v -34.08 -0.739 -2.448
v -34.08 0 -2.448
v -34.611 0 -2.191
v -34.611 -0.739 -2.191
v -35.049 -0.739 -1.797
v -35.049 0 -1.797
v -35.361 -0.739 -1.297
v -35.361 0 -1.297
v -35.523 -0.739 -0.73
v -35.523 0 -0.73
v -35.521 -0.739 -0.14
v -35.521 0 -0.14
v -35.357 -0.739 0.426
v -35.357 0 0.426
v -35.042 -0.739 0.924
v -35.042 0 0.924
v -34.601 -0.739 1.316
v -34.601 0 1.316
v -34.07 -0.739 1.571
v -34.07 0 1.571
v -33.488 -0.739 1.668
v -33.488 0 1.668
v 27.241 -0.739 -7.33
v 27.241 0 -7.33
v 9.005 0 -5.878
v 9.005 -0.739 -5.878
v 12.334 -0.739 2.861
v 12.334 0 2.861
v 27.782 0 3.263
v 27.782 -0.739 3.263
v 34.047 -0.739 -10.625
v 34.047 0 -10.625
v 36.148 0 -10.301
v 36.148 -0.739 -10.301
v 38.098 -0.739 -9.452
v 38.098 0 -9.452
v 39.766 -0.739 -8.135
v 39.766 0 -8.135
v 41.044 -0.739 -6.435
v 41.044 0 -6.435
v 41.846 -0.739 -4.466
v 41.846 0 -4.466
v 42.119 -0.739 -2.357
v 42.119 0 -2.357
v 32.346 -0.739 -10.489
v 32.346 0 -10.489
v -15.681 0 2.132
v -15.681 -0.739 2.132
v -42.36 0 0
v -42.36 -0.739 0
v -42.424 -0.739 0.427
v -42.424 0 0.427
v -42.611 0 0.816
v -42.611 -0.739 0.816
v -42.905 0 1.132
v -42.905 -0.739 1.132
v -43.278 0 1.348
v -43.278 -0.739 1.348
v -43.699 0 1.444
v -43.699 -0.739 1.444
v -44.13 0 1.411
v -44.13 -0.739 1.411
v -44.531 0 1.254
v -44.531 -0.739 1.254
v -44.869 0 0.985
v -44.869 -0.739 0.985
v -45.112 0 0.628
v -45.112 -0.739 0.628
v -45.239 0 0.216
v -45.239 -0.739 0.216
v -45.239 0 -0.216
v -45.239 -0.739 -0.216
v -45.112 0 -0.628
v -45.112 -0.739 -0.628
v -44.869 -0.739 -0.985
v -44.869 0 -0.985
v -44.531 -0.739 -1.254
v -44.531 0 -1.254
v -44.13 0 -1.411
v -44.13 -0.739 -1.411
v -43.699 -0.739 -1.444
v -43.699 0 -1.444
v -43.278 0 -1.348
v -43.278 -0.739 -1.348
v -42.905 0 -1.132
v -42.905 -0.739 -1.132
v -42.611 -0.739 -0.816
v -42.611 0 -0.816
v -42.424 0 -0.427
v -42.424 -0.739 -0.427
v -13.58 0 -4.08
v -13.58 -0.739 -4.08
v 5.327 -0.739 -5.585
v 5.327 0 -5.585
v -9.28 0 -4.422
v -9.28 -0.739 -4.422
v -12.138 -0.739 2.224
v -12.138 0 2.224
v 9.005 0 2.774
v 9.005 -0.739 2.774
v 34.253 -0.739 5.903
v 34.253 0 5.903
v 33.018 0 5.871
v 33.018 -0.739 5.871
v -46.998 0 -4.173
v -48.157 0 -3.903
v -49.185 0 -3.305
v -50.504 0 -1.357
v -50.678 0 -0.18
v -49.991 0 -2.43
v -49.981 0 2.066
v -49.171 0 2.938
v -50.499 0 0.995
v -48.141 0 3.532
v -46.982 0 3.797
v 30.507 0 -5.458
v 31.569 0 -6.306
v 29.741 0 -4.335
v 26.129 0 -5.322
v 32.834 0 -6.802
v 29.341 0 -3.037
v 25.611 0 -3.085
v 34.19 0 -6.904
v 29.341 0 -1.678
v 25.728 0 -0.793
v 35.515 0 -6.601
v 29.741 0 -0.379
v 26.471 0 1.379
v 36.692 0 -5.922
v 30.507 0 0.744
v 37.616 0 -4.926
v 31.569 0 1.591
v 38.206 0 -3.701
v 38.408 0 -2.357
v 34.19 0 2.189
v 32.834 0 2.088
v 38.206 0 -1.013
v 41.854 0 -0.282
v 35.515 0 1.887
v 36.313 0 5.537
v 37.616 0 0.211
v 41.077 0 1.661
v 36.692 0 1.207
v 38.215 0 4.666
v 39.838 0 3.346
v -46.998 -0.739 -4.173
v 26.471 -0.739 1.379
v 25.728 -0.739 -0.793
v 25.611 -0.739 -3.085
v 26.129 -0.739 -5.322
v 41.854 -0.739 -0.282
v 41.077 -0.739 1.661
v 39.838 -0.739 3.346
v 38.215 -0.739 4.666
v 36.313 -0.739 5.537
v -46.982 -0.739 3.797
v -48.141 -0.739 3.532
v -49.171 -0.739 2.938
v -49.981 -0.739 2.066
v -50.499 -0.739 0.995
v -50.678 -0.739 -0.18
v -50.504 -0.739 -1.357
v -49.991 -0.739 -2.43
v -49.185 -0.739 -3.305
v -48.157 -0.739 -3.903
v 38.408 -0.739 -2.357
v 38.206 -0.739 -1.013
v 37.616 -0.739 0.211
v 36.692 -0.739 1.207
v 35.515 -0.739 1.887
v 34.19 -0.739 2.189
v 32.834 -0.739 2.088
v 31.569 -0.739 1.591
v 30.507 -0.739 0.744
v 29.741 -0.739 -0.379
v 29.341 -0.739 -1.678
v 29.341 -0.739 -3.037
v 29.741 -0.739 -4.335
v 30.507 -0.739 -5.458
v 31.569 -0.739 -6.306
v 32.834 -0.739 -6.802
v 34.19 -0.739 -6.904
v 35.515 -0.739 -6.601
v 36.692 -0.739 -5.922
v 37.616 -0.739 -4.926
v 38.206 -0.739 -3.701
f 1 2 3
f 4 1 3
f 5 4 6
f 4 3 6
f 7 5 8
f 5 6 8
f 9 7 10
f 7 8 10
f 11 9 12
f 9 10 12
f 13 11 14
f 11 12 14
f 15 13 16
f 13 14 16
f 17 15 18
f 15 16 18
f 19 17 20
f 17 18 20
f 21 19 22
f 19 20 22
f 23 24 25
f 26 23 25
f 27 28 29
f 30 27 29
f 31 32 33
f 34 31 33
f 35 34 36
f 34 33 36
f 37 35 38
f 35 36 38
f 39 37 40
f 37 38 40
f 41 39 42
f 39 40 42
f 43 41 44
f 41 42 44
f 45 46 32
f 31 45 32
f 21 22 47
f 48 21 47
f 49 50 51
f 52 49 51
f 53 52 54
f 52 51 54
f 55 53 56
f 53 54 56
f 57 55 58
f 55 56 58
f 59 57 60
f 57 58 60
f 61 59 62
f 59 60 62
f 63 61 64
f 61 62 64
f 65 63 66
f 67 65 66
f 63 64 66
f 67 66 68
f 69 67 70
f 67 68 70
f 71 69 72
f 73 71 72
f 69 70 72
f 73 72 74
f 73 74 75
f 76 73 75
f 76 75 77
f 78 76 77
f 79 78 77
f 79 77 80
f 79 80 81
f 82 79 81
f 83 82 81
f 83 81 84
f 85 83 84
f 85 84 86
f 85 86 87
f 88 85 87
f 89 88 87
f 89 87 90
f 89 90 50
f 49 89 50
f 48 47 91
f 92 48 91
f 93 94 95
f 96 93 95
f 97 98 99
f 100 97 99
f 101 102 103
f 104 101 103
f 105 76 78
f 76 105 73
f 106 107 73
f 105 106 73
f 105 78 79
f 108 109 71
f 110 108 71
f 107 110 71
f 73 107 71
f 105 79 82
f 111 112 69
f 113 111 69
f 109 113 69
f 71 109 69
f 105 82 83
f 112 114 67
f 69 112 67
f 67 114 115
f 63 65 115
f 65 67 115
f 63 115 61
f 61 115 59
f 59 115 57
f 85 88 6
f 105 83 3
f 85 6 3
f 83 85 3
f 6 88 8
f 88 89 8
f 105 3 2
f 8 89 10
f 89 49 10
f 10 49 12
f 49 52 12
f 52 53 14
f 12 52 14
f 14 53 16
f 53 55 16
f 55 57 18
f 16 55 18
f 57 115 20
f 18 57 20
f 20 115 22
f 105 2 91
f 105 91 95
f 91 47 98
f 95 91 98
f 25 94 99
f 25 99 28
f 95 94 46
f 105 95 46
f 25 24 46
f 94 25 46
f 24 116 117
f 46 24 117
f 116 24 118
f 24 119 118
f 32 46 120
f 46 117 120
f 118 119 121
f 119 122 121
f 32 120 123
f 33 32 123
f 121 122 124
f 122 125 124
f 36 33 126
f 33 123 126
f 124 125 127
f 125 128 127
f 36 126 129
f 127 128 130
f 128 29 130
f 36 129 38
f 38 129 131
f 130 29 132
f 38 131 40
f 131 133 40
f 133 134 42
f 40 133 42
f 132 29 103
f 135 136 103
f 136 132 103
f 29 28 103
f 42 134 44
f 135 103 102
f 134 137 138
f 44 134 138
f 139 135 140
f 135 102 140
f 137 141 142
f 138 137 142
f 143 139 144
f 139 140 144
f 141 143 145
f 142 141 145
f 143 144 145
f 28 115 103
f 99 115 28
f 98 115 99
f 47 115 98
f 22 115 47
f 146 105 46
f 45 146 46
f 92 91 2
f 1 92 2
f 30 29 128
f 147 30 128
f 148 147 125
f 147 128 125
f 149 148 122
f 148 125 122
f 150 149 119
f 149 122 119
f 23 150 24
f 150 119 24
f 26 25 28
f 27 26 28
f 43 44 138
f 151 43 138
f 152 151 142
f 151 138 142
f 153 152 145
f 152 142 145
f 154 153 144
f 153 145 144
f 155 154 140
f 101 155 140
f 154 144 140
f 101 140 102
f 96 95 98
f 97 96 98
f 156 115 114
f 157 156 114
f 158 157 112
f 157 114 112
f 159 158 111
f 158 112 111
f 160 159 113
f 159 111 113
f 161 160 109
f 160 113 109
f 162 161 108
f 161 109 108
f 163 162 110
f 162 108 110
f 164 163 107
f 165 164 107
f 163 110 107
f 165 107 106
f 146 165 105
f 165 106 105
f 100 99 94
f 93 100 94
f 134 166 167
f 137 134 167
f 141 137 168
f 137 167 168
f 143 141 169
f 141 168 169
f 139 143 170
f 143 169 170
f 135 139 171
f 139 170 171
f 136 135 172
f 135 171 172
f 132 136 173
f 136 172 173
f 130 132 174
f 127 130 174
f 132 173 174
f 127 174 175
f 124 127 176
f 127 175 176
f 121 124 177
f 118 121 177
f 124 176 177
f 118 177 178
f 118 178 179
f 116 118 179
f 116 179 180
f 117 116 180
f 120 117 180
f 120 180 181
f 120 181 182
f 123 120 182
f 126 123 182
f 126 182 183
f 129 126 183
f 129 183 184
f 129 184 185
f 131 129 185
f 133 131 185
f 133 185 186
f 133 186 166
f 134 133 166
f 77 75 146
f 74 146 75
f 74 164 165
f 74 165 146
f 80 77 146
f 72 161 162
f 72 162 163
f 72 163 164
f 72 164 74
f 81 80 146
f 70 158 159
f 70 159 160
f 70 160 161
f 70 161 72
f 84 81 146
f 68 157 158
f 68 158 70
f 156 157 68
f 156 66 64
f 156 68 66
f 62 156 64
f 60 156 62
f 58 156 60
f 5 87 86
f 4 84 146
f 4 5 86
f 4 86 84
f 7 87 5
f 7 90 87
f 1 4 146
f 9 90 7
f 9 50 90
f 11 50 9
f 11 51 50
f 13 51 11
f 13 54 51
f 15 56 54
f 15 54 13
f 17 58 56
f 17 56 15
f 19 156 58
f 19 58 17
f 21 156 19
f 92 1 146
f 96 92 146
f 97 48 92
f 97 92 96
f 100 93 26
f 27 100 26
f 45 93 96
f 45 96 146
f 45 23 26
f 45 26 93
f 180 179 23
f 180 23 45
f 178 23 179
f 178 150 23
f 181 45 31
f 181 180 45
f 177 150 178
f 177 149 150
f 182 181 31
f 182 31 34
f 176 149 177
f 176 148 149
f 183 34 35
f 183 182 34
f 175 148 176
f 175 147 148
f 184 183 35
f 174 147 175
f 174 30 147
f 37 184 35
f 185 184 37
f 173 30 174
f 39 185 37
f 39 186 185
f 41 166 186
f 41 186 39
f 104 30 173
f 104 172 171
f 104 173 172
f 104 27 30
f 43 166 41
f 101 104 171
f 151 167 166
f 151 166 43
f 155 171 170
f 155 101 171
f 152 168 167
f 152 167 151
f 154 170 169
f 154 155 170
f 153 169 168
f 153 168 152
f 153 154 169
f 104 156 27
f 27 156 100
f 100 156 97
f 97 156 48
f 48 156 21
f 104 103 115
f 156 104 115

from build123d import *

# Parameters (mm, degrees)
F1_DEPTH = 0.739
F2_R     = 4.5593
F3_DEPTH = 25.4
F4_R     = 1.447766
F5_DEPTH = 25.4


with BuildPart() as f1:
    # F0 (on Front) → F1 (new body)
    with BuildSketch(Plane.XZ):
        with BuildLine():
            ThreePointArc((27.782233, 3.263093), (30.16178, 5.045361), (33.017843, 5.870969))
            Line((33.017843, 5.870969), (-46.981648, 3.796947))
            ThreePointArc((-46.981648, 3.796947), (-50.678208, -0.180343), (-46.9984, -4.173137))
            Line((-46.9984, -4.173137), (32.345508, -10.48937))
            ThreePointArc((32.345508, -10.48937), (29.496427, -9.389113), (27.240975, -7.329802))
            Line((27.240975, -7.329802), (9.005115, -5.878122))
            Line((9.005115, -5.878122), (5.326605, -5.585291))
            Line((5.326605, -5.585291), (-9.280345, -4.422494))
            Line((-9.280345, -4.422494), (-13.580459, -4.08018))
            Line((-13.580459, -4.08018), (-34.080148, -2.448286))
            ThreePointArc((-34.080148, -2.448286), (-35.521395, -0.140366), (-33.488405, 1.668126))
            Line((-33.488405, 1.668126), (-15.681088, 2.131677))
            Line((-15.681088, 2.131677), (-12.137563, 2.223921))
            Line((-12.137563, 2.223921), (9.005115, 2.774297))
            Line((9.005115, 2.774297), (12.333791, 2.860947))
            Line((12.333791, 2.860947), (27.782233, 3.263093))
        make_face()
        with BuildLine():
            ThreePointArc((34.046986, -10.624817), (39.766374, -8.134536), (42.119023, -2.357172))
            ThreePointArc((42.119023, -2.357172), (39.837821, 3.346097), (34.252707, 5.902984))
            Line((34.252707, 5.902984), (33.017843, 5.870969))
            ThreePointArc((33.017843, 5.870969), (30.16178, 5.045361), (27.782233, 3.263093))
            ThreePointArc((27.782233, 3.263093), (25.589768, -1.935156), (27.240975, -7.329802))
            ThreePointArc((27.240975, -7.329802), (29.496427, -9.389113), (32.345508, -10.48937))
            Line((32.345508, -10.48937), (34.046986, -10.624817))
        make_face()
        Polygon((9.005115, -5.878122), (12.333791, 2.860947), (9.005115, 2.774297), (5.326605, -5.585291), align=None)
        Polygon((-9.280345, -4.422494), (-12.137563, 2.223921), (-15.681088, 2.131677), (-13.580459, -4.08018), align=None)
    extrude(amount=F1_DEPTH)

    # F2 (on face) → F3 (cut)
    with BuildSketch(Plane.XZ.offset(0.739)):
        with Locations((33.849008, -2.357172)):
            Circle(F2_R)
    extrude(amount=-F3_DEPTH, mode=Mode.SUBTRACT)

    # F4 (on face) → F5 (cut)
    with BuildSketch(Plane.XZ.offset(0.739)):
        with Locations((-43.807384, 0)):
            Circle(F4_R)
    extrude(amount=-F5_DEPTH, mode=Mode.SUBTRACT)


solid = f1.part
